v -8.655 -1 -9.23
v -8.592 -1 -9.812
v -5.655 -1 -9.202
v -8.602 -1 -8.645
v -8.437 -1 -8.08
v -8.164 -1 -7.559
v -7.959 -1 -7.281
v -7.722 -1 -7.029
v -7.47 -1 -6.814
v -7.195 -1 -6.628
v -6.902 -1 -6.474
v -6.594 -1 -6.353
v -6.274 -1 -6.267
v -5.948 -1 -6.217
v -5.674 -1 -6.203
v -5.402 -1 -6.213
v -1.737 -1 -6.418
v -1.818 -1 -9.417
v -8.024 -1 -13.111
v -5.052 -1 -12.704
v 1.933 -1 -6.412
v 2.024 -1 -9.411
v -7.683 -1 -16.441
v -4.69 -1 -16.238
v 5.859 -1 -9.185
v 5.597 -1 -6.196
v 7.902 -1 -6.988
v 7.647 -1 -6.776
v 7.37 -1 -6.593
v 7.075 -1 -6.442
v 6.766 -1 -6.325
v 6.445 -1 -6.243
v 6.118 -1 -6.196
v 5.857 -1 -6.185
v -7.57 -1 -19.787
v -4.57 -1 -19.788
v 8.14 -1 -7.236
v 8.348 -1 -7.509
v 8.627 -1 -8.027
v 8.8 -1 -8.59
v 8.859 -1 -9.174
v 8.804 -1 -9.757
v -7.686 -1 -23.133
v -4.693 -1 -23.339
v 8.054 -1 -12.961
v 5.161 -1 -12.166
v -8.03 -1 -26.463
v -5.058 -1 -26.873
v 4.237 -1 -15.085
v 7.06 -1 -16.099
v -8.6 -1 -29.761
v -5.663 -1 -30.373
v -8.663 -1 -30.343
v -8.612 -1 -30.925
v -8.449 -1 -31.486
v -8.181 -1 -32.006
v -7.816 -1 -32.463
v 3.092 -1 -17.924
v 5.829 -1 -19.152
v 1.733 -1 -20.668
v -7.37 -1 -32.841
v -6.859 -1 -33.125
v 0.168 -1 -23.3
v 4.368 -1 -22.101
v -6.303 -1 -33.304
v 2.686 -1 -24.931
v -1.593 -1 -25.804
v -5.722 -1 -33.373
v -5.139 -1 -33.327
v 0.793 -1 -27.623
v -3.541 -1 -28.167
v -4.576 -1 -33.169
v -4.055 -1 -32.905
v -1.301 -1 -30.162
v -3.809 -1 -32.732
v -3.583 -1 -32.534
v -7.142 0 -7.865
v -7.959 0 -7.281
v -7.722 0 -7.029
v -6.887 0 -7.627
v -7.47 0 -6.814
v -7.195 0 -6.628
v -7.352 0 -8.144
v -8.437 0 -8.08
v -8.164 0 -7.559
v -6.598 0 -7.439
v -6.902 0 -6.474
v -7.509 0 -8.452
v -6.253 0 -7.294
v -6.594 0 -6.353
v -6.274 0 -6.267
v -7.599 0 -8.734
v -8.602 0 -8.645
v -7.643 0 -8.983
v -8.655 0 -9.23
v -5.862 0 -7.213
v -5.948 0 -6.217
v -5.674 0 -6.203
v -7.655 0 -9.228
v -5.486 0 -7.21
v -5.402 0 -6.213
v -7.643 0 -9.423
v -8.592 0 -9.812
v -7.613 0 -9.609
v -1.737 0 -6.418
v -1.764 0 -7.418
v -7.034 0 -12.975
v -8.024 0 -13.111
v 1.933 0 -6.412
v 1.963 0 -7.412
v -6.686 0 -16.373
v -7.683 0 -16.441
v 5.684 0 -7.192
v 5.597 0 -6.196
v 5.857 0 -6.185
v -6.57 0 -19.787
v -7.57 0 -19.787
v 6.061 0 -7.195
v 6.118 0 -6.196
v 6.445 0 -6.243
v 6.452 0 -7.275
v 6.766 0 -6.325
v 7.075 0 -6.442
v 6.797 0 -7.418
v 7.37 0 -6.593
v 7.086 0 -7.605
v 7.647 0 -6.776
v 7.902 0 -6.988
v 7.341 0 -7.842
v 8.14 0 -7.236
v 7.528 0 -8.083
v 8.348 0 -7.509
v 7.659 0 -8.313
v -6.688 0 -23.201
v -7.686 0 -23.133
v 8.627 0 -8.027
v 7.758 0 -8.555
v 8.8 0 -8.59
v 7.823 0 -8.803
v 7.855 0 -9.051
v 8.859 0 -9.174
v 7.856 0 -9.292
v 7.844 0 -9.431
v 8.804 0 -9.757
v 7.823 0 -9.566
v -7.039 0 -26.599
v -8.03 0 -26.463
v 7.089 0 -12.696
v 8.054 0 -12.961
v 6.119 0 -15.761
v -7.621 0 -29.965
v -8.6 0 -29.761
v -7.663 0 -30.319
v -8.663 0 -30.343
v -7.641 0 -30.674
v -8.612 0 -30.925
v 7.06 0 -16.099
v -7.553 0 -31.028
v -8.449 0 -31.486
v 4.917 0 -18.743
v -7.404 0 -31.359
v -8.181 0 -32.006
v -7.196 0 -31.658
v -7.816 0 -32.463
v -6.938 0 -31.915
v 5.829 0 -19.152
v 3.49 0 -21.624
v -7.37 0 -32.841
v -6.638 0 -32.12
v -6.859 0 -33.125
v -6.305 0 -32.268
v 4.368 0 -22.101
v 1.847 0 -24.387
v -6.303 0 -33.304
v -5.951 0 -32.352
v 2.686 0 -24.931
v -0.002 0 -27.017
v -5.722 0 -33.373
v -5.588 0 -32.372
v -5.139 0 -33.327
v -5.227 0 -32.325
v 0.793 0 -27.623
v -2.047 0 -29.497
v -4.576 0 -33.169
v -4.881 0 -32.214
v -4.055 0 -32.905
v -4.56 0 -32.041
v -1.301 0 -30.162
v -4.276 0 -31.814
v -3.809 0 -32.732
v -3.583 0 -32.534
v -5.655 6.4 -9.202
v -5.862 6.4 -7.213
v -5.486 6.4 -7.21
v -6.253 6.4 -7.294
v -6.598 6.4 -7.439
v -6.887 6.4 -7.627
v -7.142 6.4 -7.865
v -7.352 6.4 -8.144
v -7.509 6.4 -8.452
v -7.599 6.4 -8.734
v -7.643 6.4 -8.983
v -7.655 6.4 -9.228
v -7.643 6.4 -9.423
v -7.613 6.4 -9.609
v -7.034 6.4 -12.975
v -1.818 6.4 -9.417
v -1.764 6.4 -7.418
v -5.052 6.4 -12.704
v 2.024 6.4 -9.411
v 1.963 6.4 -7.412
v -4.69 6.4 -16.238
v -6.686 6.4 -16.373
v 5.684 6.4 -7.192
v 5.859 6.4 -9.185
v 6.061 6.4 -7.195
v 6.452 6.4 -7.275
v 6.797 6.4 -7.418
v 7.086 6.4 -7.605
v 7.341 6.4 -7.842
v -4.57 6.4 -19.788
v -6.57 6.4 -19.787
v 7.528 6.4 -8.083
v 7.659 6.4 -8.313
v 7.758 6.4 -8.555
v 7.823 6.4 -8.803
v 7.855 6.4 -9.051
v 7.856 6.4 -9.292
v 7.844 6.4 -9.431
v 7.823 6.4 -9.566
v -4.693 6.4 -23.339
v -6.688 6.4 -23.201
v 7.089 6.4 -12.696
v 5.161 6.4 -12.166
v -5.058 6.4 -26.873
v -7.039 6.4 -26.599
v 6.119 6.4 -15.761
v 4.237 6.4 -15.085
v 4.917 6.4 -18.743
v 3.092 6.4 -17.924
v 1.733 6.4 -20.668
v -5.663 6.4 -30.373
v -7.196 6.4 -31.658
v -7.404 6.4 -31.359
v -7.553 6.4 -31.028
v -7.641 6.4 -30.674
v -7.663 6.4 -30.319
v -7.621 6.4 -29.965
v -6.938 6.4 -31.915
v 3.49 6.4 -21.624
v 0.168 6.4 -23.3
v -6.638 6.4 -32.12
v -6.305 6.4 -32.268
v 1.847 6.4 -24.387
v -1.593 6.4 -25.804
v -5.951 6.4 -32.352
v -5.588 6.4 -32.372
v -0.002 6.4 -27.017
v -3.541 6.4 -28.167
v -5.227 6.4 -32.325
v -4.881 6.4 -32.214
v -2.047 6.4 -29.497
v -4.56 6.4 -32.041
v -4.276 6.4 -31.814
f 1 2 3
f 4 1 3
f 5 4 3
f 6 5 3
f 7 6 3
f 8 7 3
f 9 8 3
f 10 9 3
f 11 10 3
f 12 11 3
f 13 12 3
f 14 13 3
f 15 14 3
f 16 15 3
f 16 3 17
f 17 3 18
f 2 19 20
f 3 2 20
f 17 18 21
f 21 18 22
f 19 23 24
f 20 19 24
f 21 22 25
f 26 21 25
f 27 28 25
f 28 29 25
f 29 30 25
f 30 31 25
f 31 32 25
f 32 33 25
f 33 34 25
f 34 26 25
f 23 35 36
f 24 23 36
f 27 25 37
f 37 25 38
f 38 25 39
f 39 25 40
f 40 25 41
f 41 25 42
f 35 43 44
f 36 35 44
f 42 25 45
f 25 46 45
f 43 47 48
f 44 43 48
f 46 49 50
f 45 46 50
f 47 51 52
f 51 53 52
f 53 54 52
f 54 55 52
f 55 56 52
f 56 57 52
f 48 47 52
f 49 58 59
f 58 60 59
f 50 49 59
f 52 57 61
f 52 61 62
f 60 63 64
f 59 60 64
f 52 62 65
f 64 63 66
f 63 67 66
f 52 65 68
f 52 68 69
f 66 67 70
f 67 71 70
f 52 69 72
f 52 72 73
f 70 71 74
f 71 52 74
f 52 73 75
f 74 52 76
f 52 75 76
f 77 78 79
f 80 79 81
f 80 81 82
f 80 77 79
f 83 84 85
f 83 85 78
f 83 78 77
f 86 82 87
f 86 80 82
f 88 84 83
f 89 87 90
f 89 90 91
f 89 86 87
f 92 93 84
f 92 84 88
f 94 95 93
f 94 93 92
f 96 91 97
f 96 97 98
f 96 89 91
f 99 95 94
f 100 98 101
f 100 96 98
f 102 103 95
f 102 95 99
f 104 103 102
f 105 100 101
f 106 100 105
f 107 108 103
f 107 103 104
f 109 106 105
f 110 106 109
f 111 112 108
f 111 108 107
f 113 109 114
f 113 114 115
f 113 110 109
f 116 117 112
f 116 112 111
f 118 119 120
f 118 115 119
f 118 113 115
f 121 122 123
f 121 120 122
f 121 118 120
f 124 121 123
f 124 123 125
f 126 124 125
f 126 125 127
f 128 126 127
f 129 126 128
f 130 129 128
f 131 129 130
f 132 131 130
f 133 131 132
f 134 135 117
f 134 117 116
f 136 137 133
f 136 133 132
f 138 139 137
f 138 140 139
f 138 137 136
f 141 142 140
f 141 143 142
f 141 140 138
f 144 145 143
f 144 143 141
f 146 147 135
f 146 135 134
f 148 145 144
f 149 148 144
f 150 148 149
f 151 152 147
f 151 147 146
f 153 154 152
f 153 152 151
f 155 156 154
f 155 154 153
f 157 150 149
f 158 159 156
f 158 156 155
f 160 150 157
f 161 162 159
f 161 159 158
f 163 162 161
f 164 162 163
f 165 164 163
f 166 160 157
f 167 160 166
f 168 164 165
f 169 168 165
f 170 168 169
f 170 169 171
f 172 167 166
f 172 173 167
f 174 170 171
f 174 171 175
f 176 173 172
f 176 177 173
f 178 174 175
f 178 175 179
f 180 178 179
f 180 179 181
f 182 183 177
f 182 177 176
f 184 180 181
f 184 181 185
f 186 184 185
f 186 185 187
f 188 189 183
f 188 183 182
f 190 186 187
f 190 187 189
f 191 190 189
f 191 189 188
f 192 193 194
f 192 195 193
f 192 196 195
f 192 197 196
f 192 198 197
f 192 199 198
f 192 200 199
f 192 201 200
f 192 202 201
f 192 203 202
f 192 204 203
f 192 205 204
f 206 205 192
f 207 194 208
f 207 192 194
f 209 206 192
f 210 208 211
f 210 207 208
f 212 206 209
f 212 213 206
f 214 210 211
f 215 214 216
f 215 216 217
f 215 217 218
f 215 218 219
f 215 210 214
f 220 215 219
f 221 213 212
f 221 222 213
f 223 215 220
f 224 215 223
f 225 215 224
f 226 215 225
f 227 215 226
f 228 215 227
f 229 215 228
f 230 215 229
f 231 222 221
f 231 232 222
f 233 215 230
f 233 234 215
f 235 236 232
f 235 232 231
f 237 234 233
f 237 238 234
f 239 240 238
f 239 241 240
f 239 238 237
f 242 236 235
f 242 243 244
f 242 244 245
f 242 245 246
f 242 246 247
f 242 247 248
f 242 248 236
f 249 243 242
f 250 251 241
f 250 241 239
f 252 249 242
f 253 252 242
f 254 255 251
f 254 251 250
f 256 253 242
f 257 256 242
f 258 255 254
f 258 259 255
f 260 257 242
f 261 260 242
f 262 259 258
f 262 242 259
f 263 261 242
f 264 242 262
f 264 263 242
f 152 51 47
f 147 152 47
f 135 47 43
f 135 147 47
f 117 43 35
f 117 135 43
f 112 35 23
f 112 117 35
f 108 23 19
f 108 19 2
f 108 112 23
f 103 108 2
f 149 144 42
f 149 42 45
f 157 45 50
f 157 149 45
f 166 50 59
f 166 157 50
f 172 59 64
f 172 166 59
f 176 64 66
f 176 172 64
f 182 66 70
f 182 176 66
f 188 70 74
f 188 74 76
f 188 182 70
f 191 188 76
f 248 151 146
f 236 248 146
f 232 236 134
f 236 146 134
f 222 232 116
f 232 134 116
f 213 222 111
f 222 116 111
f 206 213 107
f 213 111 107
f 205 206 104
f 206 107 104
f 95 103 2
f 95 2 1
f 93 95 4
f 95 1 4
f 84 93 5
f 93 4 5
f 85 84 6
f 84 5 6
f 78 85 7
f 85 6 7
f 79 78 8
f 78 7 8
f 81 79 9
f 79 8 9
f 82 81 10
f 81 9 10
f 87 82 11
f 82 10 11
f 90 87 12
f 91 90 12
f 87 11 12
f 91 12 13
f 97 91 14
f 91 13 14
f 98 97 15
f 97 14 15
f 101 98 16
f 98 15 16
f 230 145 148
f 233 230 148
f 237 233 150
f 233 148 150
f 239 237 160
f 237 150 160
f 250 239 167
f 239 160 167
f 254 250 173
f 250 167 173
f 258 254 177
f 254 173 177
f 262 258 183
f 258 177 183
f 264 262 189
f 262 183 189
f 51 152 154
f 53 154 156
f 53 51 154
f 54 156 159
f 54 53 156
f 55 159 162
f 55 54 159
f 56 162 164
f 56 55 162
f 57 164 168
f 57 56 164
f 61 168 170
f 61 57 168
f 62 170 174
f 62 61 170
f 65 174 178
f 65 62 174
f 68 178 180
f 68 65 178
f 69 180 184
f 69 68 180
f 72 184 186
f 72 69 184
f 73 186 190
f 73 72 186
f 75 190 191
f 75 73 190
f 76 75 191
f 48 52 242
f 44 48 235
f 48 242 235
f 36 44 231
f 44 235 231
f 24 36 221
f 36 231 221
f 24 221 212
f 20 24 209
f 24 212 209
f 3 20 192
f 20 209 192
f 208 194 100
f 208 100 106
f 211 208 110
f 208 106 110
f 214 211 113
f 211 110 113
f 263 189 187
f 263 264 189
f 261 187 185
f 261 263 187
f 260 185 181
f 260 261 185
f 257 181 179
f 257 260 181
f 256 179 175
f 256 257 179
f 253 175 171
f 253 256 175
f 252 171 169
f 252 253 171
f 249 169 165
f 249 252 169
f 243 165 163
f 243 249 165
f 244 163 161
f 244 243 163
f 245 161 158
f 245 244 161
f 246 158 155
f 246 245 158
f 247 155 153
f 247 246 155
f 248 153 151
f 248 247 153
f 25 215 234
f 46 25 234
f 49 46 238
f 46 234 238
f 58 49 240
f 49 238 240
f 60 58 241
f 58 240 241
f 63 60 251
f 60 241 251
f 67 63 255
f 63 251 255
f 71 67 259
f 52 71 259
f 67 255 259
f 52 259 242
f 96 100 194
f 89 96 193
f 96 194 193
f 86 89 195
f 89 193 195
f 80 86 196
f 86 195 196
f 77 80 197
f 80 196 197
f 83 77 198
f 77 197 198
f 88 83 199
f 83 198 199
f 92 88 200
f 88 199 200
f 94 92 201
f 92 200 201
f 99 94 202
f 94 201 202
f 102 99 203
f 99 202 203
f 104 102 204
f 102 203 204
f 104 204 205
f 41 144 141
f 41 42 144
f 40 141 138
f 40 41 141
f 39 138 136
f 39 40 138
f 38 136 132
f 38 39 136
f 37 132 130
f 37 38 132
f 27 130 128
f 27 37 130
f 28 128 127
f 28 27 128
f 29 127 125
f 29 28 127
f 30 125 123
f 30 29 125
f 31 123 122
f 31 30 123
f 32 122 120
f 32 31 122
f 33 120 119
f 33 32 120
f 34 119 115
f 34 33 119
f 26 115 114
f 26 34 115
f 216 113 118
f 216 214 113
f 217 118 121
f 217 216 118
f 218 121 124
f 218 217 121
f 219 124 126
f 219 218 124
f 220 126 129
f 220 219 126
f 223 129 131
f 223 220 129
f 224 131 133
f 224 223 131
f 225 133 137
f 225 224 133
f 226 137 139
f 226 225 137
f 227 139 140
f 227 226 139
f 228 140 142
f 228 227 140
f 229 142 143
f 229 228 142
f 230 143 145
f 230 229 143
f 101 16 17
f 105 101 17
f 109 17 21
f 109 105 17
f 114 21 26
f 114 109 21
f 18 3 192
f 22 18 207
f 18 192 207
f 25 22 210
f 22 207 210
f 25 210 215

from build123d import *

# Parameters (mm, degrees)
EXTRUDE_7_DEPTH     = 6.4
EXTRUDE_8_DEPTH     = 1
FILLET_1_R          = 2
FILLET_4_R          = 3
CUT_EXTRUDE_1_DEPTH = 36.117222337


with BuildPart() as part:
    # 草图1 → 凸台-拉伸7 (new body)
    with BuildSketch(Plane(origin=(0, 0, 0), x_dir=(1, 0, 0), z_dir=(0, 1, 0))):
        with BuildLine():
            ThreePointArc((-8.25, 6.915846718), (0, 7.441530126), (8.25, 6.915846718))
            ThreePointArc((8.25, 6.915846718), (2.55299652, 23.258172204), (-9.25, 35.915846718))
            ThreePointArc((-9.25, 35.915846718), (-6.599997803, 21.489984725), (-8.25, 6.915846718))
        make_face()
        with BuildLine():
            ThreePointArc((-5.663467174, 30.373218023), (-4.570302184, 19.788295497), (-5.654744598, 9.202475772))
            ThreePointArc((-5.654744598, 9.202475772), (0.10266918, 9.441451462), (5.859323518, 9.184831872))
            ThreePointArc((5.859323518, 9.184831872), (1.732970319, 20.668203024), (-5.663467174, 30.373218023))
        make_face(mode=Mode.SUBTRACT)
    extrude(amount=EXTRUDE_7_DEPTH)

    # 草图1<9> → 凸台-拉伸8 (add)
    with BuildSketch(Plane(origin=(0, 0, 0), x_dir=(1, 0, 0), z_dir=(0, 1, 0))):
        with BuildLine():
            ThreePointArc((-11.257417673, 38.414736689), (-7.630939872, 22.203928266), (-9.628954872, 5.713034203))
            ThreePointArc((-9.628954872, 5.713034203), (-0.121629419, 6.44141455), (9.388395867, 5.749175976))
            ThreePointArc((9.388395867, 5.749175976), (2.941633426, 24.53181947), (-11.257417673, 38.414736689))
        make_face()
    extrude(amount=-EXTRUDE_8_DEPTH)

    # 圆角1
    fillet_1_edges = [part.edges().sort_by_distance(p)[0] for p in [
        (-8.25, 3.2, -6.915846718),
        (-9.25, 3.2, -35.915846718),
        (8.25, 3.2, -6.915846718),
    ]]
    fillet(fillet_1_edges, radius=FILLET_1_R)

    # 圆角4
    fillet_4_edges = [part.edges().sort_by_distance(p)[0] for p in [
        (9.388395867, -0.5, -5.749175976),
        (-9.628954872, -0.5, -5.713034203),
        (-11.257417673, -0.5, -38.414736689),
    ]]
    fillet(fillet_4_edges, radius=FILLET_4_R)

    # 草图1<10> → 切除-拉伸1 (cut, through all)
    with BuildSketch(Plane(origin=(0, 0, 0), x_dir=(1, 0, 0), z_dir=(0, 1, 0))):
        with BuildLine():
            ThreePointArc((-5.654744598, 9.202475772), (0.10266918, 9.441451462), (5.859323518, 9.184831872))
            ThreePointArc((5.859323518, 9.184831872), (1.732970319, 20.668203024), (-5.663467174, 30.373218023))
            ThreePointArc((-5.663467174, 30.373218023), (-4.570302184, 19.788295497), (-5.654744598, 9.202475772))
        make_face()
    extrude(amount=-CUT_EXTRUDE_1_DEPTH, mode=Mode.SUBTRACT)


solid = part.part
